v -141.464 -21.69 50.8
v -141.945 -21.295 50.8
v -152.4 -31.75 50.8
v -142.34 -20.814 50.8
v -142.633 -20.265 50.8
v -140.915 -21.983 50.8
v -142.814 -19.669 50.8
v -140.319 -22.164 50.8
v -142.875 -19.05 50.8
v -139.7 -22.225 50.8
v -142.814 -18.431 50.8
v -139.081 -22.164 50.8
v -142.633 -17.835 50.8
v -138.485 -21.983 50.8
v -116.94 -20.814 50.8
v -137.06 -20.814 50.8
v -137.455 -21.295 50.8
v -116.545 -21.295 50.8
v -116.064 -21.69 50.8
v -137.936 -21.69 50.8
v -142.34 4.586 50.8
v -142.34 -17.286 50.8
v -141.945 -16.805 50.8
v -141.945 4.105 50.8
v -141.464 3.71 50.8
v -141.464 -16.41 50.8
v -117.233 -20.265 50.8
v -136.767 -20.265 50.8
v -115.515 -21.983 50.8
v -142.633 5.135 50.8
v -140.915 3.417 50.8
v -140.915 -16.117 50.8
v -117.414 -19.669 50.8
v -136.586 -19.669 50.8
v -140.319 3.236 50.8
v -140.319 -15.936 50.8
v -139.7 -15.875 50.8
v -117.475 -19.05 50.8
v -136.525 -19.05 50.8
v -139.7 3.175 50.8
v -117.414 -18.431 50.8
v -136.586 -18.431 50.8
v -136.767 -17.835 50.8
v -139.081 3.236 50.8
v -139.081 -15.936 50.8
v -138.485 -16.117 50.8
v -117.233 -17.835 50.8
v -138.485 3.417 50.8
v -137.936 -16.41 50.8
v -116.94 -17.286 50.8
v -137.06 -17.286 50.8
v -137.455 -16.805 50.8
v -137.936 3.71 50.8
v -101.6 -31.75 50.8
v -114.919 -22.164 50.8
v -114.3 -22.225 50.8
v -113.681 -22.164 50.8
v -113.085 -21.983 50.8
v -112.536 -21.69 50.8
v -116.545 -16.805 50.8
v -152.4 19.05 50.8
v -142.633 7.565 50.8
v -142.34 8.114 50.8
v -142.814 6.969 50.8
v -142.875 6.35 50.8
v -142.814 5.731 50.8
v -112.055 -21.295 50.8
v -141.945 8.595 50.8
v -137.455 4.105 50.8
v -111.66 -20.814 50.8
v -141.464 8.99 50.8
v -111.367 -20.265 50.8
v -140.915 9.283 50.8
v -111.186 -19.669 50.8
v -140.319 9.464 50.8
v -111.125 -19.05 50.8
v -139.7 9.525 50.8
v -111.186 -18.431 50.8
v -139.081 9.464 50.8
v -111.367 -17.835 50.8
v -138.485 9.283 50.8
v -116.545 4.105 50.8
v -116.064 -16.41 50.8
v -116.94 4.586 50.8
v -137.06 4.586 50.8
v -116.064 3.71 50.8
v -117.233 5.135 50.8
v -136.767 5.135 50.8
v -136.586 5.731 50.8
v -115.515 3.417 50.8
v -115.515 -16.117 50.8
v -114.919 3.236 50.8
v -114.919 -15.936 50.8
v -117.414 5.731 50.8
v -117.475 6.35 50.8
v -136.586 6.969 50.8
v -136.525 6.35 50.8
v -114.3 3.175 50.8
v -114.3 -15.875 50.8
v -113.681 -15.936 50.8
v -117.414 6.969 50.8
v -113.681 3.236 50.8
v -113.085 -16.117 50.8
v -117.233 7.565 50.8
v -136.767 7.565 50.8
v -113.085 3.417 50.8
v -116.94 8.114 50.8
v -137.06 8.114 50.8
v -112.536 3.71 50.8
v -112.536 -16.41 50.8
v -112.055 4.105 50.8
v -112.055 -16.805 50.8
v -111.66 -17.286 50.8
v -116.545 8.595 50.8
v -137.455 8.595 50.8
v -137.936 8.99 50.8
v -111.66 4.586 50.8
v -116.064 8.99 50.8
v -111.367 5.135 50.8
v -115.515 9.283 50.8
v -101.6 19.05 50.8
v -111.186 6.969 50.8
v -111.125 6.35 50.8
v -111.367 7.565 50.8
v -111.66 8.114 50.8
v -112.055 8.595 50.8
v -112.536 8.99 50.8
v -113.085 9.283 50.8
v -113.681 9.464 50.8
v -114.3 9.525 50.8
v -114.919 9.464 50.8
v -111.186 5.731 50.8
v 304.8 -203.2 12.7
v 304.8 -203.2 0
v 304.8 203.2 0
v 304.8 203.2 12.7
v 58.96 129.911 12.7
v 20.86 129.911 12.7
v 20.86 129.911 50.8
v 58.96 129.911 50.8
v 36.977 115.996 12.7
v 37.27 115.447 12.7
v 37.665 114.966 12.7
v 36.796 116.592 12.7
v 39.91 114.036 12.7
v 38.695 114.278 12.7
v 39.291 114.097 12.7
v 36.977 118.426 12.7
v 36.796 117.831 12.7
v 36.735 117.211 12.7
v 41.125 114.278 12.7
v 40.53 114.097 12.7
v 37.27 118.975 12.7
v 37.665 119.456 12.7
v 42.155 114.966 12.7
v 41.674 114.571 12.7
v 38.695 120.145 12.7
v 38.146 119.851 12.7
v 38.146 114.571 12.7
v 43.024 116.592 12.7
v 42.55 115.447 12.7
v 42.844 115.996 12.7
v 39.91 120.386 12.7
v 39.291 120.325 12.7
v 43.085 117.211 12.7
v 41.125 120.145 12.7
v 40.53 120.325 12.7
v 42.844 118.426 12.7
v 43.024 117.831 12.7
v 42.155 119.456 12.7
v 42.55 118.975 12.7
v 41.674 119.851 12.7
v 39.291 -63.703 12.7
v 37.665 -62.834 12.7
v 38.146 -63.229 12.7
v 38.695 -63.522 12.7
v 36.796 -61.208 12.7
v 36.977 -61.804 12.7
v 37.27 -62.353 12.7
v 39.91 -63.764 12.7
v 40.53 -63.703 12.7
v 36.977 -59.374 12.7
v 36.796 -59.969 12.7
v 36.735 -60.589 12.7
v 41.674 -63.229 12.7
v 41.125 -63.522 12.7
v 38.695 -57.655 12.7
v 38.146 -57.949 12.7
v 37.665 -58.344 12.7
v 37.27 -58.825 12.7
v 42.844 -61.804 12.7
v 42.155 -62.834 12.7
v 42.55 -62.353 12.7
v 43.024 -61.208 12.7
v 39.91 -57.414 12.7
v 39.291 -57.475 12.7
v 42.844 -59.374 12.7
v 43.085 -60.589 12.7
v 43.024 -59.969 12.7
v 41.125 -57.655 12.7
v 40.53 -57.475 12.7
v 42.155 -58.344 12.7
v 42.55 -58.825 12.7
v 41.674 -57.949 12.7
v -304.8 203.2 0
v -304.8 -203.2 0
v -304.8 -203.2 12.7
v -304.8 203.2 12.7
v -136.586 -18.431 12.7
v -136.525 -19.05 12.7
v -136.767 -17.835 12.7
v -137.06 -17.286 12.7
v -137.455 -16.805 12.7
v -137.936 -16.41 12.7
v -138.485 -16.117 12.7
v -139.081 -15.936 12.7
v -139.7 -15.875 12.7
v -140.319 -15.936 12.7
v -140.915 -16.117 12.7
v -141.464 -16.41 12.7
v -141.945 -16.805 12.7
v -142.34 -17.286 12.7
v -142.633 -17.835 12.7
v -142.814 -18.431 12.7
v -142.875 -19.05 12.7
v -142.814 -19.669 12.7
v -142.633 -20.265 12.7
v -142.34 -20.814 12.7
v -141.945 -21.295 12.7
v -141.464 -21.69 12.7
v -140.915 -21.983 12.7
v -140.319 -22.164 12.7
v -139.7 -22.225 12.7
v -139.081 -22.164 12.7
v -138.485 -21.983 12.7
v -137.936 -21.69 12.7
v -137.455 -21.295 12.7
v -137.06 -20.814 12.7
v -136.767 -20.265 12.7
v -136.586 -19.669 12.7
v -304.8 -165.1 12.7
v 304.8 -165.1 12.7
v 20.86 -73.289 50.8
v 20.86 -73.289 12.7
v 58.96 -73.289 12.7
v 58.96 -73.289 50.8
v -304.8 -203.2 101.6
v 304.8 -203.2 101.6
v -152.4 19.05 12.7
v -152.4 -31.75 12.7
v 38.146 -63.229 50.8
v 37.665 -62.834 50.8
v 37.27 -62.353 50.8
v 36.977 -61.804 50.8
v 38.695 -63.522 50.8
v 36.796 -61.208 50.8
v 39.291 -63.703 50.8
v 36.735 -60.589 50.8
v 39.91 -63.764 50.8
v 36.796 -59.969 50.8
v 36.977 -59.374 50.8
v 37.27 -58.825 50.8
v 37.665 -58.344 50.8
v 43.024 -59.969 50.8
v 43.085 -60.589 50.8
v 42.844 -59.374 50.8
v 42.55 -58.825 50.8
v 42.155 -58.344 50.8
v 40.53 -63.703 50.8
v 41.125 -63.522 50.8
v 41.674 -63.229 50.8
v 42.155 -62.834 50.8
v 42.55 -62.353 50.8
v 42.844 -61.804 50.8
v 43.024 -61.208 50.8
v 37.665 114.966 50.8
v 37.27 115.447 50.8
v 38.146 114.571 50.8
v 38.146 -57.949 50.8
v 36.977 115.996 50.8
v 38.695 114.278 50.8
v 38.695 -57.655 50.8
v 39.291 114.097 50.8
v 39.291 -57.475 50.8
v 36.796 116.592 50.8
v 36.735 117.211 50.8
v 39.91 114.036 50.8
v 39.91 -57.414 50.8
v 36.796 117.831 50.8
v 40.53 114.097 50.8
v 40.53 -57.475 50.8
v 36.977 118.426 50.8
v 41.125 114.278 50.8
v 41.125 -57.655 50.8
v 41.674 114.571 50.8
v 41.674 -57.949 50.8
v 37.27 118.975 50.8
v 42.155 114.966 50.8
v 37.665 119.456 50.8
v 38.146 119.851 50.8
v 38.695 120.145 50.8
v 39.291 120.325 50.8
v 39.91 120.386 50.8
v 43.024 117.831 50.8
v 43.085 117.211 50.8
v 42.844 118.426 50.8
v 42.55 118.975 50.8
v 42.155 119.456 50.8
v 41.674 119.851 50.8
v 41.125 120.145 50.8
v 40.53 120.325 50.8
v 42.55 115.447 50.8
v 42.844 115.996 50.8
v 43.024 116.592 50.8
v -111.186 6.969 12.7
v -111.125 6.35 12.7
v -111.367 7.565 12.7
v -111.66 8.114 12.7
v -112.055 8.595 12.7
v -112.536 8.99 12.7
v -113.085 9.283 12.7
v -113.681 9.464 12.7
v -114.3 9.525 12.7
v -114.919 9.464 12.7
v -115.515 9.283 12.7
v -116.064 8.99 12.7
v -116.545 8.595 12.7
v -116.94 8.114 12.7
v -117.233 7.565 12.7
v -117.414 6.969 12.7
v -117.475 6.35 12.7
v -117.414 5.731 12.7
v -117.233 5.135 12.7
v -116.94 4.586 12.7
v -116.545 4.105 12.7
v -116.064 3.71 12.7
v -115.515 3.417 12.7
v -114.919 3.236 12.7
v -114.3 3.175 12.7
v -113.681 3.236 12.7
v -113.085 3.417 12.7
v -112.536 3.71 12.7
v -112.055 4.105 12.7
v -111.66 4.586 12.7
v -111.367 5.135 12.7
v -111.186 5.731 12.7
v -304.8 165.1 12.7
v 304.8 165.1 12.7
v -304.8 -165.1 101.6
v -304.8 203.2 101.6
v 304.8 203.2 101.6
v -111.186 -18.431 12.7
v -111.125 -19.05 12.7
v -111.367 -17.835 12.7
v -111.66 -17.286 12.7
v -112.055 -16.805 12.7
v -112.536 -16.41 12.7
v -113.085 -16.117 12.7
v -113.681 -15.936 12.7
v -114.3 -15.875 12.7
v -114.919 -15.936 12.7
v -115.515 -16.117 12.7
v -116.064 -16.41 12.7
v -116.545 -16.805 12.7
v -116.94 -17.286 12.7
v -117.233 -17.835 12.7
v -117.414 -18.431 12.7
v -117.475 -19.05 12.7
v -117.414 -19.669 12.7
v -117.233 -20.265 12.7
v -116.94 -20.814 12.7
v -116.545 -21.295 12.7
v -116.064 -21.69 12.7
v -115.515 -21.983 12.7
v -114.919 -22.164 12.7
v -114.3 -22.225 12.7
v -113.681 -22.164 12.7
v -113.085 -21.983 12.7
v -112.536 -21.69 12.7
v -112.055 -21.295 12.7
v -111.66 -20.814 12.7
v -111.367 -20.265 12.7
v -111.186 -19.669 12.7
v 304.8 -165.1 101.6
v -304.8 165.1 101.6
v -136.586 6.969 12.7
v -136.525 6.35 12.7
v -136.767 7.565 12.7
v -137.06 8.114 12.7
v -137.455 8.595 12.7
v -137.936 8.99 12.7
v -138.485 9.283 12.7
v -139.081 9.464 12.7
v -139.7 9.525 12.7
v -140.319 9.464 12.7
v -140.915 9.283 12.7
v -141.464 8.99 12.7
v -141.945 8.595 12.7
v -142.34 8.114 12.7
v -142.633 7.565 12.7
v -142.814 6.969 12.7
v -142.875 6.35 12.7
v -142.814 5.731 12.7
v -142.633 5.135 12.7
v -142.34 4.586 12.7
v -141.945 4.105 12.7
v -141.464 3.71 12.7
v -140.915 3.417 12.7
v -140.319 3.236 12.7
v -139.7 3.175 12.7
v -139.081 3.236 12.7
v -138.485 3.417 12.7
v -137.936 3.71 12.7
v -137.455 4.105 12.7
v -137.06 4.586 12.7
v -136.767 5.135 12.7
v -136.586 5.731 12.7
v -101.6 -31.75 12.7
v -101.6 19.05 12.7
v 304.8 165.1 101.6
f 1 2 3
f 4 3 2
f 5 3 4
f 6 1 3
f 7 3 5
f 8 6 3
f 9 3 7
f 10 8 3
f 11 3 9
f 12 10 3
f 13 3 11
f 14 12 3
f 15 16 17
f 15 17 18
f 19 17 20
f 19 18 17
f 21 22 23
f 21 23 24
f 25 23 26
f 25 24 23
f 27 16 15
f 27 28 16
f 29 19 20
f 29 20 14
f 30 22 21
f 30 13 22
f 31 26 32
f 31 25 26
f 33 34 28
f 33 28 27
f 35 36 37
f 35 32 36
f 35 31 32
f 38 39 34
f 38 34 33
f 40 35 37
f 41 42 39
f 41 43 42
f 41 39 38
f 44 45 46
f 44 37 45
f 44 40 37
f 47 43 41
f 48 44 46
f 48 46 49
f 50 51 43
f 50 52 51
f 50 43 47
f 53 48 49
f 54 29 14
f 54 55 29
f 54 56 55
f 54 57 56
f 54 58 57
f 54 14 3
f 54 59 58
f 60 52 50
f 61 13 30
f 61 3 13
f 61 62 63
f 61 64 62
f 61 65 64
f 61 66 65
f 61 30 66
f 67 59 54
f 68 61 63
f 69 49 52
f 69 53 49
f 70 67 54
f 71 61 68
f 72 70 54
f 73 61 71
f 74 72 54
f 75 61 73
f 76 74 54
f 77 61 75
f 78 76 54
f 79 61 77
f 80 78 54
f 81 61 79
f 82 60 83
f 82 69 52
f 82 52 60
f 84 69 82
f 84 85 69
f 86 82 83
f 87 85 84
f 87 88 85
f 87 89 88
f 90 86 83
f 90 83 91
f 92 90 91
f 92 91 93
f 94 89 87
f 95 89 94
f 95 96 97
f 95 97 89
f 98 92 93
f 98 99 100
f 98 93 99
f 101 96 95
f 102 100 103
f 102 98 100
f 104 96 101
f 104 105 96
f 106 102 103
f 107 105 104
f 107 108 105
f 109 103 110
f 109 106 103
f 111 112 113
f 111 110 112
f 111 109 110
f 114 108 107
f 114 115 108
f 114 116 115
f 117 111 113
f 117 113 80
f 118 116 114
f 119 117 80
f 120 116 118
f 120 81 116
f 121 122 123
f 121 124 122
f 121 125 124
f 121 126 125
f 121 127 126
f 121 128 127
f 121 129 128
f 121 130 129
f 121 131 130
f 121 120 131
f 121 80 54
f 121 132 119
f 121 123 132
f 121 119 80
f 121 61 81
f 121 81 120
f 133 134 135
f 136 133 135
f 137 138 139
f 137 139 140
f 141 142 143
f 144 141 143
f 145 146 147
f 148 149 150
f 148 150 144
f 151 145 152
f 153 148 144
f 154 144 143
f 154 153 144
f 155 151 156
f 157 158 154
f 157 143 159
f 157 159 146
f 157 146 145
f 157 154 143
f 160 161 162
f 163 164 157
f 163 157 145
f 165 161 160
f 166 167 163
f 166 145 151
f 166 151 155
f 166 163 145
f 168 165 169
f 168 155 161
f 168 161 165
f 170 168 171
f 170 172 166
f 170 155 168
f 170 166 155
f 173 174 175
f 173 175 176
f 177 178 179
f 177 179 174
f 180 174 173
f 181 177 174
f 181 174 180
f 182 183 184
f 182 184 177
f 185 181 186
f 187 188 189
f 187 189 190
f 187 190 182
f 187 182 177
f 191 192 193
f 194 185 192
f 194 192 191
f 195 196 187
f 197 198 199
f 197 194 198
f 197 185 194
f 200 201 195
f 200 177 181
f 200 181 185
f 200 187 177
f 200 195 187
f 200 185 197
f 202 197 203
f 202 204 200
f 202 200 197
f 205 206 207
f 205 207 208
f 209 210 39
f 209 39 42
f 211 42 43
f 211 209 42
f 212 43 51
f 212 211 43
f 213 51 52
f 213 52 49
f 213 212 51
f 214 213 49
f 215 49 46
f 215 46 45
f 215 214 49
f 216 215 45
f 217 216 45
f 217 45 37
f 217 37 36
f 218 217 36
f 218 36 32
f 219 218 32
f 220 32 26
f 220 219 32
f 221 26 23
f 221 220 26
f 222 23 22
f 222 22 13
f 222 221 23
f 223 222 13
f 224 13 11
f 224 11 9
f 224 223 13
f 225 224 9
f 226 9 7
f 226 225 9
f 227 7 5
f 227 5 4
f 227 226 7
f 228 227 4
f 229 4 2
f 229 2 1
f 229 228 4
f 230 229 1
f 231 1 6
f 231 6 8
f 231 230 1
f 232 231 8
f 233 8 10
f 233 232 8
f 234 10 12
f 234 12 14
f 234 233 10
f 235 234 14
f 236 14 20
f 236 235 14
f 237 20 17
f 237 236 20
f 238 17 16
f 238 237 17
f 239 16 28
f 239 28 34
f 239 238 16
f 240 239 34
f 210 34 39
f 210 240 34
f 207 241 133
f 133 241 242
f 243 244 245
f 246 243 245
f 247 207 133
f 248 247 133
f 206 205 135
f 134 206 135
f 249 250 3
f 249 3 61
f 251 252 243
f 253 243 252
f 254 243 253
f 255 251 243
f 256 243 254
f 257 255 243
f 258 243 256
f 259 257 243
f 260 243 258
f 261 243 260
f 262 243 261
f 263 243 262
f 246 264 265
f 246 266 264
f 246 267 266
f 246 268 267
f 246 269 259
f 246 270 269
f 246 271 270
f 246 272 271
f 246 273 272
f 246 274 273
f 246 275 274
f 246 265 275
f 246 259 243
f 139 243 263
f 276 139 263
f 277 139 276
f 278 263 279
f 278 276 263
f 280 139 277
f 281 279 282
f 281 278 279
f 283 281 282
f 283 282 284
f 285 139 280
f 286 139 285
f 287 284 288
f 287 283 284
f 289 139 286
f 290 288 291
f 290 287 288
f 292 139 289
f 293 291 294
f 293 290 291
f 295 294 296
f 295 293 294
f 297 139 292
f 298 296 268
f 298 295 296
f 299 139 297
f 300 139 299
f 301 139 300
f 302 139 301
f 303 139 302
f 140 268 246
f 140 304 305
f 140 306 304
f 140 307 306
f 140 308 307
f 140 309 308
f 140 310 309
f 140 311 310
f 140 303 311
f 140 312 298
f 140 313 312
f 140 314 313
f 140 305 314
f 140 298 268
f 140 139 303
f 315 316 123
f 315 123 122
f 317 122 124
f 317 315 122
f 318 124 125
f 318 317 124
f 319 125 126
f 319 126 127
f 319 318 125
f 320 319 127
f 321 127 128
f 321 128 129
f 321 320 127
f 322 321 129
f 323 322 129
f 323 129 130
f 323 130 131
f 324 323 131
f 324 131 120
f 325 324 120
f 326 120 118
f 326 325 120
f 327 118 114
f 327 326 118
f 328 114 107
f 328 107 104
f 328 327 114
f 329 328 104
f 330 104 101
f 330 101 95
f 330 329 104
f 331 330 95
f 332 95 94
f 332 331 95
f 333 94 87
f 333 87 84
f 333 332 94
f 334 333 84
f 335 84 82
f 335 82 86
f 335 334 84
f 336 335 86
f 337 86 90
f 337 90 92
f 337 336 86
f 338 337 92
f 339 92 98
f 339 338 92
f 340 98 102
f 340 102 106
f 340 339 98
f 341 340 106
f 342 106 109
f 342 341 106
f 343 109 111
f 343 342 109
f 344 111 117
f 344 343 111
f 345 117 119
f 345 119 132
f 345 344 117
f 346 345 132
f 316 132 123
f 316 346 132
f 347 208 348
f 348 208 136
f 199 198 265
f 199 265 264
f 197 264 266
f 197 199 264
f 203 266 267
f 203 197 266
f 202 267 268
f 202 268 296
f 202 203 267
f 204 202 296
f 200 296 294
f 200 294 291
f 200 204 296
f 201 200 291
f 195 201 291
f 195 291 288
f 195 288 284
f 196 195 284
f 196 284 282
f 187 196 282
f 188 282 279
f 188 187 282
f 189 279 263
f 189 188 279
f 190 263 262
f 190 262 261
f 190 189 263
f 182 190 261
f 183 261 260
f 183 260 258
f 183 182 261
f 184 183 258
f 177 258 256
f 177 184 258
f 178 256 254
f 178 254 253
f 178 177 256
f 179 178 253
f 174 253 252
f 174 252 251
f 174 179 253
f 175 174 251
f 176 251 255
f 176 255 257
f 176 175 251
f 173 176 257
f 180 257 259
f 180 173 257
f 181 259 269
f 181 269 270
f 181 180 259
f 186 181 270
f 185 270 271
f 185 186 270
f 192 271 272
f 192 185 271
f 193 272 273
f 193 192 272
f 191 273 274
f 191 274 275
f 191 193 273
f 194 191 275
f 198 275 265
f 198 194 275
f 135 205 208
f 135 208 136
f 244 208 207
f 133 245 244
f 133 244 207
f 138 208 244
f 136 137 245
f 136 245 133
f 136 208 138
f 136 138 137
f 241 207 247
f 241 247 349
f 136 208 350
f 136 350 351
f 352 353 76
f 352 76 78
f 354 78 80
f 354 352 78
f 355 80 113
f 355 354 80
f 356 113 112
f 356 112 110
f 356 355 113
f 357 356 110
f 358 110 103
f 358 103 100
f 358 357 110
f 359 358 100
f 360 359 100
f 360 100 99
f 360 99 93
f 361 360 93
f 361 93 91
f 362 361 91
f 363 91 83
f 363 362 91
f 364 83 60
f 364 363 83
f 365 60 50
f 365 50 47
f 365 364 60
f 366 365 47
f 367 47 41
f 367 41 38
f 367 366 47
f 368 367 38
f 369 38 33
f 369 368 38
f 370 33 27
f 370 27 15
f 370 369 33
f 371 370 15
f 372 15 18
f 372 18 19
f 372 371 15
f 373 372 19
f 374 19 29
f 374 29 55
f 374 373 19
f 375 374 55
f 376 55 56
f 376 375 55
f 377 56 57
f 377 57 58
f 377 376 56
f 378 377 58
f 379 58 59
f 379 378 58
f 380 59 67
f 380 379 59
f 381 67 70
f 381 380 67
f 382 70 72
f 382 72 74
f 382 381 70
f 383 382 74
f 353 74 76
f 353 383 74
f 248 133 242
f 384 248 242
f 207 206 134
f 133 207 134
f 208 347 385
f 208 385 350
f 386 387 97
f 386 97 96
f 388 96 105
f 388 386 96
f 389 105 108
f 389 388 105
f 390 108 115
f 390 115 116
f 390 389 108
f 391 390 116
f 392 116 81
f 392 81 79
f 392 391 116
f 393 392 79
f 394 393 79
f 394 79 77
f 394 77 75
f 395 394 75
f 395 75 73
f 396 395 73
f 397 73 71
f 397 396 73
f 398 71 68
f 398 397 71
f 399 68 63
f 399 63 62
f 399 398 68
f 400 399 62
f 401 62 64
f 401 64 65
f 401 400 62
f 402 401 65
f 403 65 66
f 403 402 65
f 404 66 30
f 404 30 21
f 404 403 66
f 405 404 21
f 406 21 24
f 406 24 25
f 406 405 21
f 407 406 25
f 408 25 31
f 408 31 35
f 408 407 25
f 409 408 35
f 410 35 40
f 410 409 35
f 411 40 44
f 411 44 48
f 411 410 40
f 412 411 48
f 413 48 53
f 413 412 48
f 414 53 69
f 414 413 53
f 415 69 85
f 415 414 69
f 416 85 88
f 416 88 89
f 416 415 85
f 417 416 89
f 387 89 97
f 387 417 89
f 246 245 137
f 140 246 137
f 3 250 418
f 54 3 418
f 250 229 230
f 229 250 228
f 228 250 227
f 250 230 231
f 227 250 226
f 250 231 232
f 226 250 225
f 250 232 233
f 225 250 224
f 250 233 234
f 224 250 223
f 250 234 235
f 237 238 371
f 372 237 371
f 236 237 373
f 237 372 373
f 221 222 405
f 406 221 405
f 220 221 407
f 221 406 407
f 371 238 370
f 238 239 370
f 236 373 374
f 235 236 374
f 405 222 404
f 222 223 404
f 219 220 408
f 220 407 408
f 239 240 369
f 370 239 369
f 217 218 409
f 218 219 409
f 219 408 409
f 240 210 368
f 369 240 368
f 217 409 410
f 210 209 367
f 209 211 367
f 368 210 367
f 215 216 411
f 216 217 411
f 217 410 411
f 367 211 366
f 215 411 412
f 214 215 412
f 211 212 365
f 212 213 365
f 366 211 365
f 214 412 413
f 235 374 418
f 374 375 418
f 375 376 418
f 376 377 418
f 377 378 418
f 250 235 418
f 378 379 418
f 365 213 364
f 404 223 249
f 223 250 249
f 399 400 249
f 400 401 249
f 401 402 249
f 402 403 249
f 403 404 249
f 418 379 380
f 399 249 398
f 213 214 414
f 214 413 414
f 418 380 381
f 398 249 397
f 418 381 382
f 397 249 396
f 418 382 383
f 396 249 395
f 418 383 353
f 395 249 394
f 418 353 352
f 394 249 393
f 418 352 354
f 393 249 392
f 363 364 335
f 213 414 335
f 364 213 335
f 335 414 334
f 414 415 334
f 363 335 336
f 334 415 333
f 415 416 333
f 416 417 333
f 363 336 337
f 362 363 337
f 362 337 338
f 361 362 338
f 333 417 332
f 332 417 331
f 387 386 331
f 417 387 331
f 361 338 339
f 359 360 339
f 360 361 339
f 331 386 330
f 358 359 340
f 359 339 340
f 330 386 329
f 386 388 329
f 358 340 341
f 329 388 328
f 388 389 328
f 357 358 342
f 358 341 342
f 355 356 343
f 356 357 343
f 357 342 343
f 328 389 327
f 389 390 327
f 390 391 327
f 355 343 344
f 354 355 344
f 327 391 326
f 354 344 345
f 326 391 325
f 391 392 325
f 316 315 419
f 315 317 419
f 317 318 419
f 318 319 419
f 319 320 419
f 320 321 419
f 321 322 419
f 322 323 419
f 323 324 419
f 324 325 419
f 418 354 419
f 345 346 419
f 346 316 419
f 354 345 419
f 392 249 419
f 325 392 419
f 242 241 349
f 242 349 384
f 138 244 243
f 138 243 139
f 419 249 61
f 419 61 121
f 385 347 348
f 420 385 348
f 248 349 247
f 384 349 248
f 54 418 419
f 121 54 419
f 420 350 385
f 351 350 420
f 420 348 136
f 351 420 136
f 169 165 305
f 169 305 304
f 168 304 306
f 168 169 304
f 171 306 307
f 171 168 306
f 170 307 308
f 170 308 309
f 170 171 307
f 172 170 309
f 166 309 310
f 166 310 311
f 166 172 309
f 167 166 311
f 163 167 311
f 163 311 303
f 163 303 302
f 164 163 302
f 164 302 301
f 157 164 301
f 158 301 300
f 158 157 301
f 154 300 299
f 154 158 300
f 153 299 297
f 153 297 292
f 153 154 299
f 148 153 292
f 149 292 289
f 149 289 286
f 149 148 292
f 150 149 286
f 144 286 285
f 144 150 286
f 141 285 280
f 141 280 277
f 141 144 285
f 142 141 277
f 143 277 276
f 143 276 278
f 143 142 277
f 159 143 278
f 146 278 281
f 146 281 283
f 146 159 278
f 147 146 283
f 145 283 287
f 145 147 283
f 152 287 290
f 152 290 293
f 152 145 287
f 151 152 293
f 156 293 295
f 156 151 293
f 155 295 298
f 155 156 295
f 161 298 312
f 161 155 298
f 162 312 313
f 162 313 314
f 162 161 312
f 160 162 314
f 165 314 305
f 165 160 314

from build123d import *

# Parameters (mm, degrees)
F0_W     = 609.6
F0_H     = 406.4
F1_DEPTH = 12.7
F2_W     = 609.6
F2_H     = 38.1
F3_DEPTH = 88.9
F4_W     = 50.8
F4_H     = 50.8
F4_R     = 3.175
F5_DEPTH = 38.1
F6_W     = 38.1
F6_H     = 203.2
F6_R     = 3.175
F7_DEPTH = 38.1


with BuildPart() as f1:
    # F0 (on Top) → F1 (new body)
    with BuildSketch(Plane.XY):
        Rectangle(F0_W, F0_H)
    extrude(amount=F1_DEPTH)

    # F6 (on face) → F7 (join)
    with BuildSketch(Plane.XY.offset(12.7)):
        with Locations((39.910262, 28.3112)):
            Rectangle(F6_W, F6_H)
        with Locations((39.910262, -60.5888)):
            Circle(F6_R, mode=Mode.SUBTRACT)
        with Locations((39.910262, 117.2112)):
            Circle(F6_R, mode=Mode.SUBTRACT)
    extrude(amount=F7_DEPTH)


with BuildPart() as f3:
    # F2 (on face) → F3 (new body)
    with BuildSketch(Plane.XY.offset(12.7)):
        with Locations((0, 184.15)):
            Rectangle(F2_W, F2_H)
        with Locations((0, -184.15)):
            Rectangle(F2_W, F2_H)
    extrude(amount=F3_DEPTH)


with BuildPart() as f5:
    # F4 (on face) → F5 (new body)
    with BuildSketch(Plane.XY.offset(12.7)):
        with Locations((-127, -6.35)):
            Rectangle(F4_W, F4_H)
        with Locations((-139.7, -19.05)):
            Circle(F4_R, mode=Mode.SUBTRACT)
        with Locations((-114.3, -19.05)):
            Circle(F4_R, mode=Mode.SUBTRACT)
        with Locations((-139.7, 6.35)):
            Circle(F4_R, mode=Mode.SUBTRACT)
        with Locations((-114.3, 6.35)):
            Circle(F4_R, mode=Mode.SUBTRACT)
    extrude(amount=F5_DEPTH)


solid = Compound([f1.part, f3.part, f5.part])
